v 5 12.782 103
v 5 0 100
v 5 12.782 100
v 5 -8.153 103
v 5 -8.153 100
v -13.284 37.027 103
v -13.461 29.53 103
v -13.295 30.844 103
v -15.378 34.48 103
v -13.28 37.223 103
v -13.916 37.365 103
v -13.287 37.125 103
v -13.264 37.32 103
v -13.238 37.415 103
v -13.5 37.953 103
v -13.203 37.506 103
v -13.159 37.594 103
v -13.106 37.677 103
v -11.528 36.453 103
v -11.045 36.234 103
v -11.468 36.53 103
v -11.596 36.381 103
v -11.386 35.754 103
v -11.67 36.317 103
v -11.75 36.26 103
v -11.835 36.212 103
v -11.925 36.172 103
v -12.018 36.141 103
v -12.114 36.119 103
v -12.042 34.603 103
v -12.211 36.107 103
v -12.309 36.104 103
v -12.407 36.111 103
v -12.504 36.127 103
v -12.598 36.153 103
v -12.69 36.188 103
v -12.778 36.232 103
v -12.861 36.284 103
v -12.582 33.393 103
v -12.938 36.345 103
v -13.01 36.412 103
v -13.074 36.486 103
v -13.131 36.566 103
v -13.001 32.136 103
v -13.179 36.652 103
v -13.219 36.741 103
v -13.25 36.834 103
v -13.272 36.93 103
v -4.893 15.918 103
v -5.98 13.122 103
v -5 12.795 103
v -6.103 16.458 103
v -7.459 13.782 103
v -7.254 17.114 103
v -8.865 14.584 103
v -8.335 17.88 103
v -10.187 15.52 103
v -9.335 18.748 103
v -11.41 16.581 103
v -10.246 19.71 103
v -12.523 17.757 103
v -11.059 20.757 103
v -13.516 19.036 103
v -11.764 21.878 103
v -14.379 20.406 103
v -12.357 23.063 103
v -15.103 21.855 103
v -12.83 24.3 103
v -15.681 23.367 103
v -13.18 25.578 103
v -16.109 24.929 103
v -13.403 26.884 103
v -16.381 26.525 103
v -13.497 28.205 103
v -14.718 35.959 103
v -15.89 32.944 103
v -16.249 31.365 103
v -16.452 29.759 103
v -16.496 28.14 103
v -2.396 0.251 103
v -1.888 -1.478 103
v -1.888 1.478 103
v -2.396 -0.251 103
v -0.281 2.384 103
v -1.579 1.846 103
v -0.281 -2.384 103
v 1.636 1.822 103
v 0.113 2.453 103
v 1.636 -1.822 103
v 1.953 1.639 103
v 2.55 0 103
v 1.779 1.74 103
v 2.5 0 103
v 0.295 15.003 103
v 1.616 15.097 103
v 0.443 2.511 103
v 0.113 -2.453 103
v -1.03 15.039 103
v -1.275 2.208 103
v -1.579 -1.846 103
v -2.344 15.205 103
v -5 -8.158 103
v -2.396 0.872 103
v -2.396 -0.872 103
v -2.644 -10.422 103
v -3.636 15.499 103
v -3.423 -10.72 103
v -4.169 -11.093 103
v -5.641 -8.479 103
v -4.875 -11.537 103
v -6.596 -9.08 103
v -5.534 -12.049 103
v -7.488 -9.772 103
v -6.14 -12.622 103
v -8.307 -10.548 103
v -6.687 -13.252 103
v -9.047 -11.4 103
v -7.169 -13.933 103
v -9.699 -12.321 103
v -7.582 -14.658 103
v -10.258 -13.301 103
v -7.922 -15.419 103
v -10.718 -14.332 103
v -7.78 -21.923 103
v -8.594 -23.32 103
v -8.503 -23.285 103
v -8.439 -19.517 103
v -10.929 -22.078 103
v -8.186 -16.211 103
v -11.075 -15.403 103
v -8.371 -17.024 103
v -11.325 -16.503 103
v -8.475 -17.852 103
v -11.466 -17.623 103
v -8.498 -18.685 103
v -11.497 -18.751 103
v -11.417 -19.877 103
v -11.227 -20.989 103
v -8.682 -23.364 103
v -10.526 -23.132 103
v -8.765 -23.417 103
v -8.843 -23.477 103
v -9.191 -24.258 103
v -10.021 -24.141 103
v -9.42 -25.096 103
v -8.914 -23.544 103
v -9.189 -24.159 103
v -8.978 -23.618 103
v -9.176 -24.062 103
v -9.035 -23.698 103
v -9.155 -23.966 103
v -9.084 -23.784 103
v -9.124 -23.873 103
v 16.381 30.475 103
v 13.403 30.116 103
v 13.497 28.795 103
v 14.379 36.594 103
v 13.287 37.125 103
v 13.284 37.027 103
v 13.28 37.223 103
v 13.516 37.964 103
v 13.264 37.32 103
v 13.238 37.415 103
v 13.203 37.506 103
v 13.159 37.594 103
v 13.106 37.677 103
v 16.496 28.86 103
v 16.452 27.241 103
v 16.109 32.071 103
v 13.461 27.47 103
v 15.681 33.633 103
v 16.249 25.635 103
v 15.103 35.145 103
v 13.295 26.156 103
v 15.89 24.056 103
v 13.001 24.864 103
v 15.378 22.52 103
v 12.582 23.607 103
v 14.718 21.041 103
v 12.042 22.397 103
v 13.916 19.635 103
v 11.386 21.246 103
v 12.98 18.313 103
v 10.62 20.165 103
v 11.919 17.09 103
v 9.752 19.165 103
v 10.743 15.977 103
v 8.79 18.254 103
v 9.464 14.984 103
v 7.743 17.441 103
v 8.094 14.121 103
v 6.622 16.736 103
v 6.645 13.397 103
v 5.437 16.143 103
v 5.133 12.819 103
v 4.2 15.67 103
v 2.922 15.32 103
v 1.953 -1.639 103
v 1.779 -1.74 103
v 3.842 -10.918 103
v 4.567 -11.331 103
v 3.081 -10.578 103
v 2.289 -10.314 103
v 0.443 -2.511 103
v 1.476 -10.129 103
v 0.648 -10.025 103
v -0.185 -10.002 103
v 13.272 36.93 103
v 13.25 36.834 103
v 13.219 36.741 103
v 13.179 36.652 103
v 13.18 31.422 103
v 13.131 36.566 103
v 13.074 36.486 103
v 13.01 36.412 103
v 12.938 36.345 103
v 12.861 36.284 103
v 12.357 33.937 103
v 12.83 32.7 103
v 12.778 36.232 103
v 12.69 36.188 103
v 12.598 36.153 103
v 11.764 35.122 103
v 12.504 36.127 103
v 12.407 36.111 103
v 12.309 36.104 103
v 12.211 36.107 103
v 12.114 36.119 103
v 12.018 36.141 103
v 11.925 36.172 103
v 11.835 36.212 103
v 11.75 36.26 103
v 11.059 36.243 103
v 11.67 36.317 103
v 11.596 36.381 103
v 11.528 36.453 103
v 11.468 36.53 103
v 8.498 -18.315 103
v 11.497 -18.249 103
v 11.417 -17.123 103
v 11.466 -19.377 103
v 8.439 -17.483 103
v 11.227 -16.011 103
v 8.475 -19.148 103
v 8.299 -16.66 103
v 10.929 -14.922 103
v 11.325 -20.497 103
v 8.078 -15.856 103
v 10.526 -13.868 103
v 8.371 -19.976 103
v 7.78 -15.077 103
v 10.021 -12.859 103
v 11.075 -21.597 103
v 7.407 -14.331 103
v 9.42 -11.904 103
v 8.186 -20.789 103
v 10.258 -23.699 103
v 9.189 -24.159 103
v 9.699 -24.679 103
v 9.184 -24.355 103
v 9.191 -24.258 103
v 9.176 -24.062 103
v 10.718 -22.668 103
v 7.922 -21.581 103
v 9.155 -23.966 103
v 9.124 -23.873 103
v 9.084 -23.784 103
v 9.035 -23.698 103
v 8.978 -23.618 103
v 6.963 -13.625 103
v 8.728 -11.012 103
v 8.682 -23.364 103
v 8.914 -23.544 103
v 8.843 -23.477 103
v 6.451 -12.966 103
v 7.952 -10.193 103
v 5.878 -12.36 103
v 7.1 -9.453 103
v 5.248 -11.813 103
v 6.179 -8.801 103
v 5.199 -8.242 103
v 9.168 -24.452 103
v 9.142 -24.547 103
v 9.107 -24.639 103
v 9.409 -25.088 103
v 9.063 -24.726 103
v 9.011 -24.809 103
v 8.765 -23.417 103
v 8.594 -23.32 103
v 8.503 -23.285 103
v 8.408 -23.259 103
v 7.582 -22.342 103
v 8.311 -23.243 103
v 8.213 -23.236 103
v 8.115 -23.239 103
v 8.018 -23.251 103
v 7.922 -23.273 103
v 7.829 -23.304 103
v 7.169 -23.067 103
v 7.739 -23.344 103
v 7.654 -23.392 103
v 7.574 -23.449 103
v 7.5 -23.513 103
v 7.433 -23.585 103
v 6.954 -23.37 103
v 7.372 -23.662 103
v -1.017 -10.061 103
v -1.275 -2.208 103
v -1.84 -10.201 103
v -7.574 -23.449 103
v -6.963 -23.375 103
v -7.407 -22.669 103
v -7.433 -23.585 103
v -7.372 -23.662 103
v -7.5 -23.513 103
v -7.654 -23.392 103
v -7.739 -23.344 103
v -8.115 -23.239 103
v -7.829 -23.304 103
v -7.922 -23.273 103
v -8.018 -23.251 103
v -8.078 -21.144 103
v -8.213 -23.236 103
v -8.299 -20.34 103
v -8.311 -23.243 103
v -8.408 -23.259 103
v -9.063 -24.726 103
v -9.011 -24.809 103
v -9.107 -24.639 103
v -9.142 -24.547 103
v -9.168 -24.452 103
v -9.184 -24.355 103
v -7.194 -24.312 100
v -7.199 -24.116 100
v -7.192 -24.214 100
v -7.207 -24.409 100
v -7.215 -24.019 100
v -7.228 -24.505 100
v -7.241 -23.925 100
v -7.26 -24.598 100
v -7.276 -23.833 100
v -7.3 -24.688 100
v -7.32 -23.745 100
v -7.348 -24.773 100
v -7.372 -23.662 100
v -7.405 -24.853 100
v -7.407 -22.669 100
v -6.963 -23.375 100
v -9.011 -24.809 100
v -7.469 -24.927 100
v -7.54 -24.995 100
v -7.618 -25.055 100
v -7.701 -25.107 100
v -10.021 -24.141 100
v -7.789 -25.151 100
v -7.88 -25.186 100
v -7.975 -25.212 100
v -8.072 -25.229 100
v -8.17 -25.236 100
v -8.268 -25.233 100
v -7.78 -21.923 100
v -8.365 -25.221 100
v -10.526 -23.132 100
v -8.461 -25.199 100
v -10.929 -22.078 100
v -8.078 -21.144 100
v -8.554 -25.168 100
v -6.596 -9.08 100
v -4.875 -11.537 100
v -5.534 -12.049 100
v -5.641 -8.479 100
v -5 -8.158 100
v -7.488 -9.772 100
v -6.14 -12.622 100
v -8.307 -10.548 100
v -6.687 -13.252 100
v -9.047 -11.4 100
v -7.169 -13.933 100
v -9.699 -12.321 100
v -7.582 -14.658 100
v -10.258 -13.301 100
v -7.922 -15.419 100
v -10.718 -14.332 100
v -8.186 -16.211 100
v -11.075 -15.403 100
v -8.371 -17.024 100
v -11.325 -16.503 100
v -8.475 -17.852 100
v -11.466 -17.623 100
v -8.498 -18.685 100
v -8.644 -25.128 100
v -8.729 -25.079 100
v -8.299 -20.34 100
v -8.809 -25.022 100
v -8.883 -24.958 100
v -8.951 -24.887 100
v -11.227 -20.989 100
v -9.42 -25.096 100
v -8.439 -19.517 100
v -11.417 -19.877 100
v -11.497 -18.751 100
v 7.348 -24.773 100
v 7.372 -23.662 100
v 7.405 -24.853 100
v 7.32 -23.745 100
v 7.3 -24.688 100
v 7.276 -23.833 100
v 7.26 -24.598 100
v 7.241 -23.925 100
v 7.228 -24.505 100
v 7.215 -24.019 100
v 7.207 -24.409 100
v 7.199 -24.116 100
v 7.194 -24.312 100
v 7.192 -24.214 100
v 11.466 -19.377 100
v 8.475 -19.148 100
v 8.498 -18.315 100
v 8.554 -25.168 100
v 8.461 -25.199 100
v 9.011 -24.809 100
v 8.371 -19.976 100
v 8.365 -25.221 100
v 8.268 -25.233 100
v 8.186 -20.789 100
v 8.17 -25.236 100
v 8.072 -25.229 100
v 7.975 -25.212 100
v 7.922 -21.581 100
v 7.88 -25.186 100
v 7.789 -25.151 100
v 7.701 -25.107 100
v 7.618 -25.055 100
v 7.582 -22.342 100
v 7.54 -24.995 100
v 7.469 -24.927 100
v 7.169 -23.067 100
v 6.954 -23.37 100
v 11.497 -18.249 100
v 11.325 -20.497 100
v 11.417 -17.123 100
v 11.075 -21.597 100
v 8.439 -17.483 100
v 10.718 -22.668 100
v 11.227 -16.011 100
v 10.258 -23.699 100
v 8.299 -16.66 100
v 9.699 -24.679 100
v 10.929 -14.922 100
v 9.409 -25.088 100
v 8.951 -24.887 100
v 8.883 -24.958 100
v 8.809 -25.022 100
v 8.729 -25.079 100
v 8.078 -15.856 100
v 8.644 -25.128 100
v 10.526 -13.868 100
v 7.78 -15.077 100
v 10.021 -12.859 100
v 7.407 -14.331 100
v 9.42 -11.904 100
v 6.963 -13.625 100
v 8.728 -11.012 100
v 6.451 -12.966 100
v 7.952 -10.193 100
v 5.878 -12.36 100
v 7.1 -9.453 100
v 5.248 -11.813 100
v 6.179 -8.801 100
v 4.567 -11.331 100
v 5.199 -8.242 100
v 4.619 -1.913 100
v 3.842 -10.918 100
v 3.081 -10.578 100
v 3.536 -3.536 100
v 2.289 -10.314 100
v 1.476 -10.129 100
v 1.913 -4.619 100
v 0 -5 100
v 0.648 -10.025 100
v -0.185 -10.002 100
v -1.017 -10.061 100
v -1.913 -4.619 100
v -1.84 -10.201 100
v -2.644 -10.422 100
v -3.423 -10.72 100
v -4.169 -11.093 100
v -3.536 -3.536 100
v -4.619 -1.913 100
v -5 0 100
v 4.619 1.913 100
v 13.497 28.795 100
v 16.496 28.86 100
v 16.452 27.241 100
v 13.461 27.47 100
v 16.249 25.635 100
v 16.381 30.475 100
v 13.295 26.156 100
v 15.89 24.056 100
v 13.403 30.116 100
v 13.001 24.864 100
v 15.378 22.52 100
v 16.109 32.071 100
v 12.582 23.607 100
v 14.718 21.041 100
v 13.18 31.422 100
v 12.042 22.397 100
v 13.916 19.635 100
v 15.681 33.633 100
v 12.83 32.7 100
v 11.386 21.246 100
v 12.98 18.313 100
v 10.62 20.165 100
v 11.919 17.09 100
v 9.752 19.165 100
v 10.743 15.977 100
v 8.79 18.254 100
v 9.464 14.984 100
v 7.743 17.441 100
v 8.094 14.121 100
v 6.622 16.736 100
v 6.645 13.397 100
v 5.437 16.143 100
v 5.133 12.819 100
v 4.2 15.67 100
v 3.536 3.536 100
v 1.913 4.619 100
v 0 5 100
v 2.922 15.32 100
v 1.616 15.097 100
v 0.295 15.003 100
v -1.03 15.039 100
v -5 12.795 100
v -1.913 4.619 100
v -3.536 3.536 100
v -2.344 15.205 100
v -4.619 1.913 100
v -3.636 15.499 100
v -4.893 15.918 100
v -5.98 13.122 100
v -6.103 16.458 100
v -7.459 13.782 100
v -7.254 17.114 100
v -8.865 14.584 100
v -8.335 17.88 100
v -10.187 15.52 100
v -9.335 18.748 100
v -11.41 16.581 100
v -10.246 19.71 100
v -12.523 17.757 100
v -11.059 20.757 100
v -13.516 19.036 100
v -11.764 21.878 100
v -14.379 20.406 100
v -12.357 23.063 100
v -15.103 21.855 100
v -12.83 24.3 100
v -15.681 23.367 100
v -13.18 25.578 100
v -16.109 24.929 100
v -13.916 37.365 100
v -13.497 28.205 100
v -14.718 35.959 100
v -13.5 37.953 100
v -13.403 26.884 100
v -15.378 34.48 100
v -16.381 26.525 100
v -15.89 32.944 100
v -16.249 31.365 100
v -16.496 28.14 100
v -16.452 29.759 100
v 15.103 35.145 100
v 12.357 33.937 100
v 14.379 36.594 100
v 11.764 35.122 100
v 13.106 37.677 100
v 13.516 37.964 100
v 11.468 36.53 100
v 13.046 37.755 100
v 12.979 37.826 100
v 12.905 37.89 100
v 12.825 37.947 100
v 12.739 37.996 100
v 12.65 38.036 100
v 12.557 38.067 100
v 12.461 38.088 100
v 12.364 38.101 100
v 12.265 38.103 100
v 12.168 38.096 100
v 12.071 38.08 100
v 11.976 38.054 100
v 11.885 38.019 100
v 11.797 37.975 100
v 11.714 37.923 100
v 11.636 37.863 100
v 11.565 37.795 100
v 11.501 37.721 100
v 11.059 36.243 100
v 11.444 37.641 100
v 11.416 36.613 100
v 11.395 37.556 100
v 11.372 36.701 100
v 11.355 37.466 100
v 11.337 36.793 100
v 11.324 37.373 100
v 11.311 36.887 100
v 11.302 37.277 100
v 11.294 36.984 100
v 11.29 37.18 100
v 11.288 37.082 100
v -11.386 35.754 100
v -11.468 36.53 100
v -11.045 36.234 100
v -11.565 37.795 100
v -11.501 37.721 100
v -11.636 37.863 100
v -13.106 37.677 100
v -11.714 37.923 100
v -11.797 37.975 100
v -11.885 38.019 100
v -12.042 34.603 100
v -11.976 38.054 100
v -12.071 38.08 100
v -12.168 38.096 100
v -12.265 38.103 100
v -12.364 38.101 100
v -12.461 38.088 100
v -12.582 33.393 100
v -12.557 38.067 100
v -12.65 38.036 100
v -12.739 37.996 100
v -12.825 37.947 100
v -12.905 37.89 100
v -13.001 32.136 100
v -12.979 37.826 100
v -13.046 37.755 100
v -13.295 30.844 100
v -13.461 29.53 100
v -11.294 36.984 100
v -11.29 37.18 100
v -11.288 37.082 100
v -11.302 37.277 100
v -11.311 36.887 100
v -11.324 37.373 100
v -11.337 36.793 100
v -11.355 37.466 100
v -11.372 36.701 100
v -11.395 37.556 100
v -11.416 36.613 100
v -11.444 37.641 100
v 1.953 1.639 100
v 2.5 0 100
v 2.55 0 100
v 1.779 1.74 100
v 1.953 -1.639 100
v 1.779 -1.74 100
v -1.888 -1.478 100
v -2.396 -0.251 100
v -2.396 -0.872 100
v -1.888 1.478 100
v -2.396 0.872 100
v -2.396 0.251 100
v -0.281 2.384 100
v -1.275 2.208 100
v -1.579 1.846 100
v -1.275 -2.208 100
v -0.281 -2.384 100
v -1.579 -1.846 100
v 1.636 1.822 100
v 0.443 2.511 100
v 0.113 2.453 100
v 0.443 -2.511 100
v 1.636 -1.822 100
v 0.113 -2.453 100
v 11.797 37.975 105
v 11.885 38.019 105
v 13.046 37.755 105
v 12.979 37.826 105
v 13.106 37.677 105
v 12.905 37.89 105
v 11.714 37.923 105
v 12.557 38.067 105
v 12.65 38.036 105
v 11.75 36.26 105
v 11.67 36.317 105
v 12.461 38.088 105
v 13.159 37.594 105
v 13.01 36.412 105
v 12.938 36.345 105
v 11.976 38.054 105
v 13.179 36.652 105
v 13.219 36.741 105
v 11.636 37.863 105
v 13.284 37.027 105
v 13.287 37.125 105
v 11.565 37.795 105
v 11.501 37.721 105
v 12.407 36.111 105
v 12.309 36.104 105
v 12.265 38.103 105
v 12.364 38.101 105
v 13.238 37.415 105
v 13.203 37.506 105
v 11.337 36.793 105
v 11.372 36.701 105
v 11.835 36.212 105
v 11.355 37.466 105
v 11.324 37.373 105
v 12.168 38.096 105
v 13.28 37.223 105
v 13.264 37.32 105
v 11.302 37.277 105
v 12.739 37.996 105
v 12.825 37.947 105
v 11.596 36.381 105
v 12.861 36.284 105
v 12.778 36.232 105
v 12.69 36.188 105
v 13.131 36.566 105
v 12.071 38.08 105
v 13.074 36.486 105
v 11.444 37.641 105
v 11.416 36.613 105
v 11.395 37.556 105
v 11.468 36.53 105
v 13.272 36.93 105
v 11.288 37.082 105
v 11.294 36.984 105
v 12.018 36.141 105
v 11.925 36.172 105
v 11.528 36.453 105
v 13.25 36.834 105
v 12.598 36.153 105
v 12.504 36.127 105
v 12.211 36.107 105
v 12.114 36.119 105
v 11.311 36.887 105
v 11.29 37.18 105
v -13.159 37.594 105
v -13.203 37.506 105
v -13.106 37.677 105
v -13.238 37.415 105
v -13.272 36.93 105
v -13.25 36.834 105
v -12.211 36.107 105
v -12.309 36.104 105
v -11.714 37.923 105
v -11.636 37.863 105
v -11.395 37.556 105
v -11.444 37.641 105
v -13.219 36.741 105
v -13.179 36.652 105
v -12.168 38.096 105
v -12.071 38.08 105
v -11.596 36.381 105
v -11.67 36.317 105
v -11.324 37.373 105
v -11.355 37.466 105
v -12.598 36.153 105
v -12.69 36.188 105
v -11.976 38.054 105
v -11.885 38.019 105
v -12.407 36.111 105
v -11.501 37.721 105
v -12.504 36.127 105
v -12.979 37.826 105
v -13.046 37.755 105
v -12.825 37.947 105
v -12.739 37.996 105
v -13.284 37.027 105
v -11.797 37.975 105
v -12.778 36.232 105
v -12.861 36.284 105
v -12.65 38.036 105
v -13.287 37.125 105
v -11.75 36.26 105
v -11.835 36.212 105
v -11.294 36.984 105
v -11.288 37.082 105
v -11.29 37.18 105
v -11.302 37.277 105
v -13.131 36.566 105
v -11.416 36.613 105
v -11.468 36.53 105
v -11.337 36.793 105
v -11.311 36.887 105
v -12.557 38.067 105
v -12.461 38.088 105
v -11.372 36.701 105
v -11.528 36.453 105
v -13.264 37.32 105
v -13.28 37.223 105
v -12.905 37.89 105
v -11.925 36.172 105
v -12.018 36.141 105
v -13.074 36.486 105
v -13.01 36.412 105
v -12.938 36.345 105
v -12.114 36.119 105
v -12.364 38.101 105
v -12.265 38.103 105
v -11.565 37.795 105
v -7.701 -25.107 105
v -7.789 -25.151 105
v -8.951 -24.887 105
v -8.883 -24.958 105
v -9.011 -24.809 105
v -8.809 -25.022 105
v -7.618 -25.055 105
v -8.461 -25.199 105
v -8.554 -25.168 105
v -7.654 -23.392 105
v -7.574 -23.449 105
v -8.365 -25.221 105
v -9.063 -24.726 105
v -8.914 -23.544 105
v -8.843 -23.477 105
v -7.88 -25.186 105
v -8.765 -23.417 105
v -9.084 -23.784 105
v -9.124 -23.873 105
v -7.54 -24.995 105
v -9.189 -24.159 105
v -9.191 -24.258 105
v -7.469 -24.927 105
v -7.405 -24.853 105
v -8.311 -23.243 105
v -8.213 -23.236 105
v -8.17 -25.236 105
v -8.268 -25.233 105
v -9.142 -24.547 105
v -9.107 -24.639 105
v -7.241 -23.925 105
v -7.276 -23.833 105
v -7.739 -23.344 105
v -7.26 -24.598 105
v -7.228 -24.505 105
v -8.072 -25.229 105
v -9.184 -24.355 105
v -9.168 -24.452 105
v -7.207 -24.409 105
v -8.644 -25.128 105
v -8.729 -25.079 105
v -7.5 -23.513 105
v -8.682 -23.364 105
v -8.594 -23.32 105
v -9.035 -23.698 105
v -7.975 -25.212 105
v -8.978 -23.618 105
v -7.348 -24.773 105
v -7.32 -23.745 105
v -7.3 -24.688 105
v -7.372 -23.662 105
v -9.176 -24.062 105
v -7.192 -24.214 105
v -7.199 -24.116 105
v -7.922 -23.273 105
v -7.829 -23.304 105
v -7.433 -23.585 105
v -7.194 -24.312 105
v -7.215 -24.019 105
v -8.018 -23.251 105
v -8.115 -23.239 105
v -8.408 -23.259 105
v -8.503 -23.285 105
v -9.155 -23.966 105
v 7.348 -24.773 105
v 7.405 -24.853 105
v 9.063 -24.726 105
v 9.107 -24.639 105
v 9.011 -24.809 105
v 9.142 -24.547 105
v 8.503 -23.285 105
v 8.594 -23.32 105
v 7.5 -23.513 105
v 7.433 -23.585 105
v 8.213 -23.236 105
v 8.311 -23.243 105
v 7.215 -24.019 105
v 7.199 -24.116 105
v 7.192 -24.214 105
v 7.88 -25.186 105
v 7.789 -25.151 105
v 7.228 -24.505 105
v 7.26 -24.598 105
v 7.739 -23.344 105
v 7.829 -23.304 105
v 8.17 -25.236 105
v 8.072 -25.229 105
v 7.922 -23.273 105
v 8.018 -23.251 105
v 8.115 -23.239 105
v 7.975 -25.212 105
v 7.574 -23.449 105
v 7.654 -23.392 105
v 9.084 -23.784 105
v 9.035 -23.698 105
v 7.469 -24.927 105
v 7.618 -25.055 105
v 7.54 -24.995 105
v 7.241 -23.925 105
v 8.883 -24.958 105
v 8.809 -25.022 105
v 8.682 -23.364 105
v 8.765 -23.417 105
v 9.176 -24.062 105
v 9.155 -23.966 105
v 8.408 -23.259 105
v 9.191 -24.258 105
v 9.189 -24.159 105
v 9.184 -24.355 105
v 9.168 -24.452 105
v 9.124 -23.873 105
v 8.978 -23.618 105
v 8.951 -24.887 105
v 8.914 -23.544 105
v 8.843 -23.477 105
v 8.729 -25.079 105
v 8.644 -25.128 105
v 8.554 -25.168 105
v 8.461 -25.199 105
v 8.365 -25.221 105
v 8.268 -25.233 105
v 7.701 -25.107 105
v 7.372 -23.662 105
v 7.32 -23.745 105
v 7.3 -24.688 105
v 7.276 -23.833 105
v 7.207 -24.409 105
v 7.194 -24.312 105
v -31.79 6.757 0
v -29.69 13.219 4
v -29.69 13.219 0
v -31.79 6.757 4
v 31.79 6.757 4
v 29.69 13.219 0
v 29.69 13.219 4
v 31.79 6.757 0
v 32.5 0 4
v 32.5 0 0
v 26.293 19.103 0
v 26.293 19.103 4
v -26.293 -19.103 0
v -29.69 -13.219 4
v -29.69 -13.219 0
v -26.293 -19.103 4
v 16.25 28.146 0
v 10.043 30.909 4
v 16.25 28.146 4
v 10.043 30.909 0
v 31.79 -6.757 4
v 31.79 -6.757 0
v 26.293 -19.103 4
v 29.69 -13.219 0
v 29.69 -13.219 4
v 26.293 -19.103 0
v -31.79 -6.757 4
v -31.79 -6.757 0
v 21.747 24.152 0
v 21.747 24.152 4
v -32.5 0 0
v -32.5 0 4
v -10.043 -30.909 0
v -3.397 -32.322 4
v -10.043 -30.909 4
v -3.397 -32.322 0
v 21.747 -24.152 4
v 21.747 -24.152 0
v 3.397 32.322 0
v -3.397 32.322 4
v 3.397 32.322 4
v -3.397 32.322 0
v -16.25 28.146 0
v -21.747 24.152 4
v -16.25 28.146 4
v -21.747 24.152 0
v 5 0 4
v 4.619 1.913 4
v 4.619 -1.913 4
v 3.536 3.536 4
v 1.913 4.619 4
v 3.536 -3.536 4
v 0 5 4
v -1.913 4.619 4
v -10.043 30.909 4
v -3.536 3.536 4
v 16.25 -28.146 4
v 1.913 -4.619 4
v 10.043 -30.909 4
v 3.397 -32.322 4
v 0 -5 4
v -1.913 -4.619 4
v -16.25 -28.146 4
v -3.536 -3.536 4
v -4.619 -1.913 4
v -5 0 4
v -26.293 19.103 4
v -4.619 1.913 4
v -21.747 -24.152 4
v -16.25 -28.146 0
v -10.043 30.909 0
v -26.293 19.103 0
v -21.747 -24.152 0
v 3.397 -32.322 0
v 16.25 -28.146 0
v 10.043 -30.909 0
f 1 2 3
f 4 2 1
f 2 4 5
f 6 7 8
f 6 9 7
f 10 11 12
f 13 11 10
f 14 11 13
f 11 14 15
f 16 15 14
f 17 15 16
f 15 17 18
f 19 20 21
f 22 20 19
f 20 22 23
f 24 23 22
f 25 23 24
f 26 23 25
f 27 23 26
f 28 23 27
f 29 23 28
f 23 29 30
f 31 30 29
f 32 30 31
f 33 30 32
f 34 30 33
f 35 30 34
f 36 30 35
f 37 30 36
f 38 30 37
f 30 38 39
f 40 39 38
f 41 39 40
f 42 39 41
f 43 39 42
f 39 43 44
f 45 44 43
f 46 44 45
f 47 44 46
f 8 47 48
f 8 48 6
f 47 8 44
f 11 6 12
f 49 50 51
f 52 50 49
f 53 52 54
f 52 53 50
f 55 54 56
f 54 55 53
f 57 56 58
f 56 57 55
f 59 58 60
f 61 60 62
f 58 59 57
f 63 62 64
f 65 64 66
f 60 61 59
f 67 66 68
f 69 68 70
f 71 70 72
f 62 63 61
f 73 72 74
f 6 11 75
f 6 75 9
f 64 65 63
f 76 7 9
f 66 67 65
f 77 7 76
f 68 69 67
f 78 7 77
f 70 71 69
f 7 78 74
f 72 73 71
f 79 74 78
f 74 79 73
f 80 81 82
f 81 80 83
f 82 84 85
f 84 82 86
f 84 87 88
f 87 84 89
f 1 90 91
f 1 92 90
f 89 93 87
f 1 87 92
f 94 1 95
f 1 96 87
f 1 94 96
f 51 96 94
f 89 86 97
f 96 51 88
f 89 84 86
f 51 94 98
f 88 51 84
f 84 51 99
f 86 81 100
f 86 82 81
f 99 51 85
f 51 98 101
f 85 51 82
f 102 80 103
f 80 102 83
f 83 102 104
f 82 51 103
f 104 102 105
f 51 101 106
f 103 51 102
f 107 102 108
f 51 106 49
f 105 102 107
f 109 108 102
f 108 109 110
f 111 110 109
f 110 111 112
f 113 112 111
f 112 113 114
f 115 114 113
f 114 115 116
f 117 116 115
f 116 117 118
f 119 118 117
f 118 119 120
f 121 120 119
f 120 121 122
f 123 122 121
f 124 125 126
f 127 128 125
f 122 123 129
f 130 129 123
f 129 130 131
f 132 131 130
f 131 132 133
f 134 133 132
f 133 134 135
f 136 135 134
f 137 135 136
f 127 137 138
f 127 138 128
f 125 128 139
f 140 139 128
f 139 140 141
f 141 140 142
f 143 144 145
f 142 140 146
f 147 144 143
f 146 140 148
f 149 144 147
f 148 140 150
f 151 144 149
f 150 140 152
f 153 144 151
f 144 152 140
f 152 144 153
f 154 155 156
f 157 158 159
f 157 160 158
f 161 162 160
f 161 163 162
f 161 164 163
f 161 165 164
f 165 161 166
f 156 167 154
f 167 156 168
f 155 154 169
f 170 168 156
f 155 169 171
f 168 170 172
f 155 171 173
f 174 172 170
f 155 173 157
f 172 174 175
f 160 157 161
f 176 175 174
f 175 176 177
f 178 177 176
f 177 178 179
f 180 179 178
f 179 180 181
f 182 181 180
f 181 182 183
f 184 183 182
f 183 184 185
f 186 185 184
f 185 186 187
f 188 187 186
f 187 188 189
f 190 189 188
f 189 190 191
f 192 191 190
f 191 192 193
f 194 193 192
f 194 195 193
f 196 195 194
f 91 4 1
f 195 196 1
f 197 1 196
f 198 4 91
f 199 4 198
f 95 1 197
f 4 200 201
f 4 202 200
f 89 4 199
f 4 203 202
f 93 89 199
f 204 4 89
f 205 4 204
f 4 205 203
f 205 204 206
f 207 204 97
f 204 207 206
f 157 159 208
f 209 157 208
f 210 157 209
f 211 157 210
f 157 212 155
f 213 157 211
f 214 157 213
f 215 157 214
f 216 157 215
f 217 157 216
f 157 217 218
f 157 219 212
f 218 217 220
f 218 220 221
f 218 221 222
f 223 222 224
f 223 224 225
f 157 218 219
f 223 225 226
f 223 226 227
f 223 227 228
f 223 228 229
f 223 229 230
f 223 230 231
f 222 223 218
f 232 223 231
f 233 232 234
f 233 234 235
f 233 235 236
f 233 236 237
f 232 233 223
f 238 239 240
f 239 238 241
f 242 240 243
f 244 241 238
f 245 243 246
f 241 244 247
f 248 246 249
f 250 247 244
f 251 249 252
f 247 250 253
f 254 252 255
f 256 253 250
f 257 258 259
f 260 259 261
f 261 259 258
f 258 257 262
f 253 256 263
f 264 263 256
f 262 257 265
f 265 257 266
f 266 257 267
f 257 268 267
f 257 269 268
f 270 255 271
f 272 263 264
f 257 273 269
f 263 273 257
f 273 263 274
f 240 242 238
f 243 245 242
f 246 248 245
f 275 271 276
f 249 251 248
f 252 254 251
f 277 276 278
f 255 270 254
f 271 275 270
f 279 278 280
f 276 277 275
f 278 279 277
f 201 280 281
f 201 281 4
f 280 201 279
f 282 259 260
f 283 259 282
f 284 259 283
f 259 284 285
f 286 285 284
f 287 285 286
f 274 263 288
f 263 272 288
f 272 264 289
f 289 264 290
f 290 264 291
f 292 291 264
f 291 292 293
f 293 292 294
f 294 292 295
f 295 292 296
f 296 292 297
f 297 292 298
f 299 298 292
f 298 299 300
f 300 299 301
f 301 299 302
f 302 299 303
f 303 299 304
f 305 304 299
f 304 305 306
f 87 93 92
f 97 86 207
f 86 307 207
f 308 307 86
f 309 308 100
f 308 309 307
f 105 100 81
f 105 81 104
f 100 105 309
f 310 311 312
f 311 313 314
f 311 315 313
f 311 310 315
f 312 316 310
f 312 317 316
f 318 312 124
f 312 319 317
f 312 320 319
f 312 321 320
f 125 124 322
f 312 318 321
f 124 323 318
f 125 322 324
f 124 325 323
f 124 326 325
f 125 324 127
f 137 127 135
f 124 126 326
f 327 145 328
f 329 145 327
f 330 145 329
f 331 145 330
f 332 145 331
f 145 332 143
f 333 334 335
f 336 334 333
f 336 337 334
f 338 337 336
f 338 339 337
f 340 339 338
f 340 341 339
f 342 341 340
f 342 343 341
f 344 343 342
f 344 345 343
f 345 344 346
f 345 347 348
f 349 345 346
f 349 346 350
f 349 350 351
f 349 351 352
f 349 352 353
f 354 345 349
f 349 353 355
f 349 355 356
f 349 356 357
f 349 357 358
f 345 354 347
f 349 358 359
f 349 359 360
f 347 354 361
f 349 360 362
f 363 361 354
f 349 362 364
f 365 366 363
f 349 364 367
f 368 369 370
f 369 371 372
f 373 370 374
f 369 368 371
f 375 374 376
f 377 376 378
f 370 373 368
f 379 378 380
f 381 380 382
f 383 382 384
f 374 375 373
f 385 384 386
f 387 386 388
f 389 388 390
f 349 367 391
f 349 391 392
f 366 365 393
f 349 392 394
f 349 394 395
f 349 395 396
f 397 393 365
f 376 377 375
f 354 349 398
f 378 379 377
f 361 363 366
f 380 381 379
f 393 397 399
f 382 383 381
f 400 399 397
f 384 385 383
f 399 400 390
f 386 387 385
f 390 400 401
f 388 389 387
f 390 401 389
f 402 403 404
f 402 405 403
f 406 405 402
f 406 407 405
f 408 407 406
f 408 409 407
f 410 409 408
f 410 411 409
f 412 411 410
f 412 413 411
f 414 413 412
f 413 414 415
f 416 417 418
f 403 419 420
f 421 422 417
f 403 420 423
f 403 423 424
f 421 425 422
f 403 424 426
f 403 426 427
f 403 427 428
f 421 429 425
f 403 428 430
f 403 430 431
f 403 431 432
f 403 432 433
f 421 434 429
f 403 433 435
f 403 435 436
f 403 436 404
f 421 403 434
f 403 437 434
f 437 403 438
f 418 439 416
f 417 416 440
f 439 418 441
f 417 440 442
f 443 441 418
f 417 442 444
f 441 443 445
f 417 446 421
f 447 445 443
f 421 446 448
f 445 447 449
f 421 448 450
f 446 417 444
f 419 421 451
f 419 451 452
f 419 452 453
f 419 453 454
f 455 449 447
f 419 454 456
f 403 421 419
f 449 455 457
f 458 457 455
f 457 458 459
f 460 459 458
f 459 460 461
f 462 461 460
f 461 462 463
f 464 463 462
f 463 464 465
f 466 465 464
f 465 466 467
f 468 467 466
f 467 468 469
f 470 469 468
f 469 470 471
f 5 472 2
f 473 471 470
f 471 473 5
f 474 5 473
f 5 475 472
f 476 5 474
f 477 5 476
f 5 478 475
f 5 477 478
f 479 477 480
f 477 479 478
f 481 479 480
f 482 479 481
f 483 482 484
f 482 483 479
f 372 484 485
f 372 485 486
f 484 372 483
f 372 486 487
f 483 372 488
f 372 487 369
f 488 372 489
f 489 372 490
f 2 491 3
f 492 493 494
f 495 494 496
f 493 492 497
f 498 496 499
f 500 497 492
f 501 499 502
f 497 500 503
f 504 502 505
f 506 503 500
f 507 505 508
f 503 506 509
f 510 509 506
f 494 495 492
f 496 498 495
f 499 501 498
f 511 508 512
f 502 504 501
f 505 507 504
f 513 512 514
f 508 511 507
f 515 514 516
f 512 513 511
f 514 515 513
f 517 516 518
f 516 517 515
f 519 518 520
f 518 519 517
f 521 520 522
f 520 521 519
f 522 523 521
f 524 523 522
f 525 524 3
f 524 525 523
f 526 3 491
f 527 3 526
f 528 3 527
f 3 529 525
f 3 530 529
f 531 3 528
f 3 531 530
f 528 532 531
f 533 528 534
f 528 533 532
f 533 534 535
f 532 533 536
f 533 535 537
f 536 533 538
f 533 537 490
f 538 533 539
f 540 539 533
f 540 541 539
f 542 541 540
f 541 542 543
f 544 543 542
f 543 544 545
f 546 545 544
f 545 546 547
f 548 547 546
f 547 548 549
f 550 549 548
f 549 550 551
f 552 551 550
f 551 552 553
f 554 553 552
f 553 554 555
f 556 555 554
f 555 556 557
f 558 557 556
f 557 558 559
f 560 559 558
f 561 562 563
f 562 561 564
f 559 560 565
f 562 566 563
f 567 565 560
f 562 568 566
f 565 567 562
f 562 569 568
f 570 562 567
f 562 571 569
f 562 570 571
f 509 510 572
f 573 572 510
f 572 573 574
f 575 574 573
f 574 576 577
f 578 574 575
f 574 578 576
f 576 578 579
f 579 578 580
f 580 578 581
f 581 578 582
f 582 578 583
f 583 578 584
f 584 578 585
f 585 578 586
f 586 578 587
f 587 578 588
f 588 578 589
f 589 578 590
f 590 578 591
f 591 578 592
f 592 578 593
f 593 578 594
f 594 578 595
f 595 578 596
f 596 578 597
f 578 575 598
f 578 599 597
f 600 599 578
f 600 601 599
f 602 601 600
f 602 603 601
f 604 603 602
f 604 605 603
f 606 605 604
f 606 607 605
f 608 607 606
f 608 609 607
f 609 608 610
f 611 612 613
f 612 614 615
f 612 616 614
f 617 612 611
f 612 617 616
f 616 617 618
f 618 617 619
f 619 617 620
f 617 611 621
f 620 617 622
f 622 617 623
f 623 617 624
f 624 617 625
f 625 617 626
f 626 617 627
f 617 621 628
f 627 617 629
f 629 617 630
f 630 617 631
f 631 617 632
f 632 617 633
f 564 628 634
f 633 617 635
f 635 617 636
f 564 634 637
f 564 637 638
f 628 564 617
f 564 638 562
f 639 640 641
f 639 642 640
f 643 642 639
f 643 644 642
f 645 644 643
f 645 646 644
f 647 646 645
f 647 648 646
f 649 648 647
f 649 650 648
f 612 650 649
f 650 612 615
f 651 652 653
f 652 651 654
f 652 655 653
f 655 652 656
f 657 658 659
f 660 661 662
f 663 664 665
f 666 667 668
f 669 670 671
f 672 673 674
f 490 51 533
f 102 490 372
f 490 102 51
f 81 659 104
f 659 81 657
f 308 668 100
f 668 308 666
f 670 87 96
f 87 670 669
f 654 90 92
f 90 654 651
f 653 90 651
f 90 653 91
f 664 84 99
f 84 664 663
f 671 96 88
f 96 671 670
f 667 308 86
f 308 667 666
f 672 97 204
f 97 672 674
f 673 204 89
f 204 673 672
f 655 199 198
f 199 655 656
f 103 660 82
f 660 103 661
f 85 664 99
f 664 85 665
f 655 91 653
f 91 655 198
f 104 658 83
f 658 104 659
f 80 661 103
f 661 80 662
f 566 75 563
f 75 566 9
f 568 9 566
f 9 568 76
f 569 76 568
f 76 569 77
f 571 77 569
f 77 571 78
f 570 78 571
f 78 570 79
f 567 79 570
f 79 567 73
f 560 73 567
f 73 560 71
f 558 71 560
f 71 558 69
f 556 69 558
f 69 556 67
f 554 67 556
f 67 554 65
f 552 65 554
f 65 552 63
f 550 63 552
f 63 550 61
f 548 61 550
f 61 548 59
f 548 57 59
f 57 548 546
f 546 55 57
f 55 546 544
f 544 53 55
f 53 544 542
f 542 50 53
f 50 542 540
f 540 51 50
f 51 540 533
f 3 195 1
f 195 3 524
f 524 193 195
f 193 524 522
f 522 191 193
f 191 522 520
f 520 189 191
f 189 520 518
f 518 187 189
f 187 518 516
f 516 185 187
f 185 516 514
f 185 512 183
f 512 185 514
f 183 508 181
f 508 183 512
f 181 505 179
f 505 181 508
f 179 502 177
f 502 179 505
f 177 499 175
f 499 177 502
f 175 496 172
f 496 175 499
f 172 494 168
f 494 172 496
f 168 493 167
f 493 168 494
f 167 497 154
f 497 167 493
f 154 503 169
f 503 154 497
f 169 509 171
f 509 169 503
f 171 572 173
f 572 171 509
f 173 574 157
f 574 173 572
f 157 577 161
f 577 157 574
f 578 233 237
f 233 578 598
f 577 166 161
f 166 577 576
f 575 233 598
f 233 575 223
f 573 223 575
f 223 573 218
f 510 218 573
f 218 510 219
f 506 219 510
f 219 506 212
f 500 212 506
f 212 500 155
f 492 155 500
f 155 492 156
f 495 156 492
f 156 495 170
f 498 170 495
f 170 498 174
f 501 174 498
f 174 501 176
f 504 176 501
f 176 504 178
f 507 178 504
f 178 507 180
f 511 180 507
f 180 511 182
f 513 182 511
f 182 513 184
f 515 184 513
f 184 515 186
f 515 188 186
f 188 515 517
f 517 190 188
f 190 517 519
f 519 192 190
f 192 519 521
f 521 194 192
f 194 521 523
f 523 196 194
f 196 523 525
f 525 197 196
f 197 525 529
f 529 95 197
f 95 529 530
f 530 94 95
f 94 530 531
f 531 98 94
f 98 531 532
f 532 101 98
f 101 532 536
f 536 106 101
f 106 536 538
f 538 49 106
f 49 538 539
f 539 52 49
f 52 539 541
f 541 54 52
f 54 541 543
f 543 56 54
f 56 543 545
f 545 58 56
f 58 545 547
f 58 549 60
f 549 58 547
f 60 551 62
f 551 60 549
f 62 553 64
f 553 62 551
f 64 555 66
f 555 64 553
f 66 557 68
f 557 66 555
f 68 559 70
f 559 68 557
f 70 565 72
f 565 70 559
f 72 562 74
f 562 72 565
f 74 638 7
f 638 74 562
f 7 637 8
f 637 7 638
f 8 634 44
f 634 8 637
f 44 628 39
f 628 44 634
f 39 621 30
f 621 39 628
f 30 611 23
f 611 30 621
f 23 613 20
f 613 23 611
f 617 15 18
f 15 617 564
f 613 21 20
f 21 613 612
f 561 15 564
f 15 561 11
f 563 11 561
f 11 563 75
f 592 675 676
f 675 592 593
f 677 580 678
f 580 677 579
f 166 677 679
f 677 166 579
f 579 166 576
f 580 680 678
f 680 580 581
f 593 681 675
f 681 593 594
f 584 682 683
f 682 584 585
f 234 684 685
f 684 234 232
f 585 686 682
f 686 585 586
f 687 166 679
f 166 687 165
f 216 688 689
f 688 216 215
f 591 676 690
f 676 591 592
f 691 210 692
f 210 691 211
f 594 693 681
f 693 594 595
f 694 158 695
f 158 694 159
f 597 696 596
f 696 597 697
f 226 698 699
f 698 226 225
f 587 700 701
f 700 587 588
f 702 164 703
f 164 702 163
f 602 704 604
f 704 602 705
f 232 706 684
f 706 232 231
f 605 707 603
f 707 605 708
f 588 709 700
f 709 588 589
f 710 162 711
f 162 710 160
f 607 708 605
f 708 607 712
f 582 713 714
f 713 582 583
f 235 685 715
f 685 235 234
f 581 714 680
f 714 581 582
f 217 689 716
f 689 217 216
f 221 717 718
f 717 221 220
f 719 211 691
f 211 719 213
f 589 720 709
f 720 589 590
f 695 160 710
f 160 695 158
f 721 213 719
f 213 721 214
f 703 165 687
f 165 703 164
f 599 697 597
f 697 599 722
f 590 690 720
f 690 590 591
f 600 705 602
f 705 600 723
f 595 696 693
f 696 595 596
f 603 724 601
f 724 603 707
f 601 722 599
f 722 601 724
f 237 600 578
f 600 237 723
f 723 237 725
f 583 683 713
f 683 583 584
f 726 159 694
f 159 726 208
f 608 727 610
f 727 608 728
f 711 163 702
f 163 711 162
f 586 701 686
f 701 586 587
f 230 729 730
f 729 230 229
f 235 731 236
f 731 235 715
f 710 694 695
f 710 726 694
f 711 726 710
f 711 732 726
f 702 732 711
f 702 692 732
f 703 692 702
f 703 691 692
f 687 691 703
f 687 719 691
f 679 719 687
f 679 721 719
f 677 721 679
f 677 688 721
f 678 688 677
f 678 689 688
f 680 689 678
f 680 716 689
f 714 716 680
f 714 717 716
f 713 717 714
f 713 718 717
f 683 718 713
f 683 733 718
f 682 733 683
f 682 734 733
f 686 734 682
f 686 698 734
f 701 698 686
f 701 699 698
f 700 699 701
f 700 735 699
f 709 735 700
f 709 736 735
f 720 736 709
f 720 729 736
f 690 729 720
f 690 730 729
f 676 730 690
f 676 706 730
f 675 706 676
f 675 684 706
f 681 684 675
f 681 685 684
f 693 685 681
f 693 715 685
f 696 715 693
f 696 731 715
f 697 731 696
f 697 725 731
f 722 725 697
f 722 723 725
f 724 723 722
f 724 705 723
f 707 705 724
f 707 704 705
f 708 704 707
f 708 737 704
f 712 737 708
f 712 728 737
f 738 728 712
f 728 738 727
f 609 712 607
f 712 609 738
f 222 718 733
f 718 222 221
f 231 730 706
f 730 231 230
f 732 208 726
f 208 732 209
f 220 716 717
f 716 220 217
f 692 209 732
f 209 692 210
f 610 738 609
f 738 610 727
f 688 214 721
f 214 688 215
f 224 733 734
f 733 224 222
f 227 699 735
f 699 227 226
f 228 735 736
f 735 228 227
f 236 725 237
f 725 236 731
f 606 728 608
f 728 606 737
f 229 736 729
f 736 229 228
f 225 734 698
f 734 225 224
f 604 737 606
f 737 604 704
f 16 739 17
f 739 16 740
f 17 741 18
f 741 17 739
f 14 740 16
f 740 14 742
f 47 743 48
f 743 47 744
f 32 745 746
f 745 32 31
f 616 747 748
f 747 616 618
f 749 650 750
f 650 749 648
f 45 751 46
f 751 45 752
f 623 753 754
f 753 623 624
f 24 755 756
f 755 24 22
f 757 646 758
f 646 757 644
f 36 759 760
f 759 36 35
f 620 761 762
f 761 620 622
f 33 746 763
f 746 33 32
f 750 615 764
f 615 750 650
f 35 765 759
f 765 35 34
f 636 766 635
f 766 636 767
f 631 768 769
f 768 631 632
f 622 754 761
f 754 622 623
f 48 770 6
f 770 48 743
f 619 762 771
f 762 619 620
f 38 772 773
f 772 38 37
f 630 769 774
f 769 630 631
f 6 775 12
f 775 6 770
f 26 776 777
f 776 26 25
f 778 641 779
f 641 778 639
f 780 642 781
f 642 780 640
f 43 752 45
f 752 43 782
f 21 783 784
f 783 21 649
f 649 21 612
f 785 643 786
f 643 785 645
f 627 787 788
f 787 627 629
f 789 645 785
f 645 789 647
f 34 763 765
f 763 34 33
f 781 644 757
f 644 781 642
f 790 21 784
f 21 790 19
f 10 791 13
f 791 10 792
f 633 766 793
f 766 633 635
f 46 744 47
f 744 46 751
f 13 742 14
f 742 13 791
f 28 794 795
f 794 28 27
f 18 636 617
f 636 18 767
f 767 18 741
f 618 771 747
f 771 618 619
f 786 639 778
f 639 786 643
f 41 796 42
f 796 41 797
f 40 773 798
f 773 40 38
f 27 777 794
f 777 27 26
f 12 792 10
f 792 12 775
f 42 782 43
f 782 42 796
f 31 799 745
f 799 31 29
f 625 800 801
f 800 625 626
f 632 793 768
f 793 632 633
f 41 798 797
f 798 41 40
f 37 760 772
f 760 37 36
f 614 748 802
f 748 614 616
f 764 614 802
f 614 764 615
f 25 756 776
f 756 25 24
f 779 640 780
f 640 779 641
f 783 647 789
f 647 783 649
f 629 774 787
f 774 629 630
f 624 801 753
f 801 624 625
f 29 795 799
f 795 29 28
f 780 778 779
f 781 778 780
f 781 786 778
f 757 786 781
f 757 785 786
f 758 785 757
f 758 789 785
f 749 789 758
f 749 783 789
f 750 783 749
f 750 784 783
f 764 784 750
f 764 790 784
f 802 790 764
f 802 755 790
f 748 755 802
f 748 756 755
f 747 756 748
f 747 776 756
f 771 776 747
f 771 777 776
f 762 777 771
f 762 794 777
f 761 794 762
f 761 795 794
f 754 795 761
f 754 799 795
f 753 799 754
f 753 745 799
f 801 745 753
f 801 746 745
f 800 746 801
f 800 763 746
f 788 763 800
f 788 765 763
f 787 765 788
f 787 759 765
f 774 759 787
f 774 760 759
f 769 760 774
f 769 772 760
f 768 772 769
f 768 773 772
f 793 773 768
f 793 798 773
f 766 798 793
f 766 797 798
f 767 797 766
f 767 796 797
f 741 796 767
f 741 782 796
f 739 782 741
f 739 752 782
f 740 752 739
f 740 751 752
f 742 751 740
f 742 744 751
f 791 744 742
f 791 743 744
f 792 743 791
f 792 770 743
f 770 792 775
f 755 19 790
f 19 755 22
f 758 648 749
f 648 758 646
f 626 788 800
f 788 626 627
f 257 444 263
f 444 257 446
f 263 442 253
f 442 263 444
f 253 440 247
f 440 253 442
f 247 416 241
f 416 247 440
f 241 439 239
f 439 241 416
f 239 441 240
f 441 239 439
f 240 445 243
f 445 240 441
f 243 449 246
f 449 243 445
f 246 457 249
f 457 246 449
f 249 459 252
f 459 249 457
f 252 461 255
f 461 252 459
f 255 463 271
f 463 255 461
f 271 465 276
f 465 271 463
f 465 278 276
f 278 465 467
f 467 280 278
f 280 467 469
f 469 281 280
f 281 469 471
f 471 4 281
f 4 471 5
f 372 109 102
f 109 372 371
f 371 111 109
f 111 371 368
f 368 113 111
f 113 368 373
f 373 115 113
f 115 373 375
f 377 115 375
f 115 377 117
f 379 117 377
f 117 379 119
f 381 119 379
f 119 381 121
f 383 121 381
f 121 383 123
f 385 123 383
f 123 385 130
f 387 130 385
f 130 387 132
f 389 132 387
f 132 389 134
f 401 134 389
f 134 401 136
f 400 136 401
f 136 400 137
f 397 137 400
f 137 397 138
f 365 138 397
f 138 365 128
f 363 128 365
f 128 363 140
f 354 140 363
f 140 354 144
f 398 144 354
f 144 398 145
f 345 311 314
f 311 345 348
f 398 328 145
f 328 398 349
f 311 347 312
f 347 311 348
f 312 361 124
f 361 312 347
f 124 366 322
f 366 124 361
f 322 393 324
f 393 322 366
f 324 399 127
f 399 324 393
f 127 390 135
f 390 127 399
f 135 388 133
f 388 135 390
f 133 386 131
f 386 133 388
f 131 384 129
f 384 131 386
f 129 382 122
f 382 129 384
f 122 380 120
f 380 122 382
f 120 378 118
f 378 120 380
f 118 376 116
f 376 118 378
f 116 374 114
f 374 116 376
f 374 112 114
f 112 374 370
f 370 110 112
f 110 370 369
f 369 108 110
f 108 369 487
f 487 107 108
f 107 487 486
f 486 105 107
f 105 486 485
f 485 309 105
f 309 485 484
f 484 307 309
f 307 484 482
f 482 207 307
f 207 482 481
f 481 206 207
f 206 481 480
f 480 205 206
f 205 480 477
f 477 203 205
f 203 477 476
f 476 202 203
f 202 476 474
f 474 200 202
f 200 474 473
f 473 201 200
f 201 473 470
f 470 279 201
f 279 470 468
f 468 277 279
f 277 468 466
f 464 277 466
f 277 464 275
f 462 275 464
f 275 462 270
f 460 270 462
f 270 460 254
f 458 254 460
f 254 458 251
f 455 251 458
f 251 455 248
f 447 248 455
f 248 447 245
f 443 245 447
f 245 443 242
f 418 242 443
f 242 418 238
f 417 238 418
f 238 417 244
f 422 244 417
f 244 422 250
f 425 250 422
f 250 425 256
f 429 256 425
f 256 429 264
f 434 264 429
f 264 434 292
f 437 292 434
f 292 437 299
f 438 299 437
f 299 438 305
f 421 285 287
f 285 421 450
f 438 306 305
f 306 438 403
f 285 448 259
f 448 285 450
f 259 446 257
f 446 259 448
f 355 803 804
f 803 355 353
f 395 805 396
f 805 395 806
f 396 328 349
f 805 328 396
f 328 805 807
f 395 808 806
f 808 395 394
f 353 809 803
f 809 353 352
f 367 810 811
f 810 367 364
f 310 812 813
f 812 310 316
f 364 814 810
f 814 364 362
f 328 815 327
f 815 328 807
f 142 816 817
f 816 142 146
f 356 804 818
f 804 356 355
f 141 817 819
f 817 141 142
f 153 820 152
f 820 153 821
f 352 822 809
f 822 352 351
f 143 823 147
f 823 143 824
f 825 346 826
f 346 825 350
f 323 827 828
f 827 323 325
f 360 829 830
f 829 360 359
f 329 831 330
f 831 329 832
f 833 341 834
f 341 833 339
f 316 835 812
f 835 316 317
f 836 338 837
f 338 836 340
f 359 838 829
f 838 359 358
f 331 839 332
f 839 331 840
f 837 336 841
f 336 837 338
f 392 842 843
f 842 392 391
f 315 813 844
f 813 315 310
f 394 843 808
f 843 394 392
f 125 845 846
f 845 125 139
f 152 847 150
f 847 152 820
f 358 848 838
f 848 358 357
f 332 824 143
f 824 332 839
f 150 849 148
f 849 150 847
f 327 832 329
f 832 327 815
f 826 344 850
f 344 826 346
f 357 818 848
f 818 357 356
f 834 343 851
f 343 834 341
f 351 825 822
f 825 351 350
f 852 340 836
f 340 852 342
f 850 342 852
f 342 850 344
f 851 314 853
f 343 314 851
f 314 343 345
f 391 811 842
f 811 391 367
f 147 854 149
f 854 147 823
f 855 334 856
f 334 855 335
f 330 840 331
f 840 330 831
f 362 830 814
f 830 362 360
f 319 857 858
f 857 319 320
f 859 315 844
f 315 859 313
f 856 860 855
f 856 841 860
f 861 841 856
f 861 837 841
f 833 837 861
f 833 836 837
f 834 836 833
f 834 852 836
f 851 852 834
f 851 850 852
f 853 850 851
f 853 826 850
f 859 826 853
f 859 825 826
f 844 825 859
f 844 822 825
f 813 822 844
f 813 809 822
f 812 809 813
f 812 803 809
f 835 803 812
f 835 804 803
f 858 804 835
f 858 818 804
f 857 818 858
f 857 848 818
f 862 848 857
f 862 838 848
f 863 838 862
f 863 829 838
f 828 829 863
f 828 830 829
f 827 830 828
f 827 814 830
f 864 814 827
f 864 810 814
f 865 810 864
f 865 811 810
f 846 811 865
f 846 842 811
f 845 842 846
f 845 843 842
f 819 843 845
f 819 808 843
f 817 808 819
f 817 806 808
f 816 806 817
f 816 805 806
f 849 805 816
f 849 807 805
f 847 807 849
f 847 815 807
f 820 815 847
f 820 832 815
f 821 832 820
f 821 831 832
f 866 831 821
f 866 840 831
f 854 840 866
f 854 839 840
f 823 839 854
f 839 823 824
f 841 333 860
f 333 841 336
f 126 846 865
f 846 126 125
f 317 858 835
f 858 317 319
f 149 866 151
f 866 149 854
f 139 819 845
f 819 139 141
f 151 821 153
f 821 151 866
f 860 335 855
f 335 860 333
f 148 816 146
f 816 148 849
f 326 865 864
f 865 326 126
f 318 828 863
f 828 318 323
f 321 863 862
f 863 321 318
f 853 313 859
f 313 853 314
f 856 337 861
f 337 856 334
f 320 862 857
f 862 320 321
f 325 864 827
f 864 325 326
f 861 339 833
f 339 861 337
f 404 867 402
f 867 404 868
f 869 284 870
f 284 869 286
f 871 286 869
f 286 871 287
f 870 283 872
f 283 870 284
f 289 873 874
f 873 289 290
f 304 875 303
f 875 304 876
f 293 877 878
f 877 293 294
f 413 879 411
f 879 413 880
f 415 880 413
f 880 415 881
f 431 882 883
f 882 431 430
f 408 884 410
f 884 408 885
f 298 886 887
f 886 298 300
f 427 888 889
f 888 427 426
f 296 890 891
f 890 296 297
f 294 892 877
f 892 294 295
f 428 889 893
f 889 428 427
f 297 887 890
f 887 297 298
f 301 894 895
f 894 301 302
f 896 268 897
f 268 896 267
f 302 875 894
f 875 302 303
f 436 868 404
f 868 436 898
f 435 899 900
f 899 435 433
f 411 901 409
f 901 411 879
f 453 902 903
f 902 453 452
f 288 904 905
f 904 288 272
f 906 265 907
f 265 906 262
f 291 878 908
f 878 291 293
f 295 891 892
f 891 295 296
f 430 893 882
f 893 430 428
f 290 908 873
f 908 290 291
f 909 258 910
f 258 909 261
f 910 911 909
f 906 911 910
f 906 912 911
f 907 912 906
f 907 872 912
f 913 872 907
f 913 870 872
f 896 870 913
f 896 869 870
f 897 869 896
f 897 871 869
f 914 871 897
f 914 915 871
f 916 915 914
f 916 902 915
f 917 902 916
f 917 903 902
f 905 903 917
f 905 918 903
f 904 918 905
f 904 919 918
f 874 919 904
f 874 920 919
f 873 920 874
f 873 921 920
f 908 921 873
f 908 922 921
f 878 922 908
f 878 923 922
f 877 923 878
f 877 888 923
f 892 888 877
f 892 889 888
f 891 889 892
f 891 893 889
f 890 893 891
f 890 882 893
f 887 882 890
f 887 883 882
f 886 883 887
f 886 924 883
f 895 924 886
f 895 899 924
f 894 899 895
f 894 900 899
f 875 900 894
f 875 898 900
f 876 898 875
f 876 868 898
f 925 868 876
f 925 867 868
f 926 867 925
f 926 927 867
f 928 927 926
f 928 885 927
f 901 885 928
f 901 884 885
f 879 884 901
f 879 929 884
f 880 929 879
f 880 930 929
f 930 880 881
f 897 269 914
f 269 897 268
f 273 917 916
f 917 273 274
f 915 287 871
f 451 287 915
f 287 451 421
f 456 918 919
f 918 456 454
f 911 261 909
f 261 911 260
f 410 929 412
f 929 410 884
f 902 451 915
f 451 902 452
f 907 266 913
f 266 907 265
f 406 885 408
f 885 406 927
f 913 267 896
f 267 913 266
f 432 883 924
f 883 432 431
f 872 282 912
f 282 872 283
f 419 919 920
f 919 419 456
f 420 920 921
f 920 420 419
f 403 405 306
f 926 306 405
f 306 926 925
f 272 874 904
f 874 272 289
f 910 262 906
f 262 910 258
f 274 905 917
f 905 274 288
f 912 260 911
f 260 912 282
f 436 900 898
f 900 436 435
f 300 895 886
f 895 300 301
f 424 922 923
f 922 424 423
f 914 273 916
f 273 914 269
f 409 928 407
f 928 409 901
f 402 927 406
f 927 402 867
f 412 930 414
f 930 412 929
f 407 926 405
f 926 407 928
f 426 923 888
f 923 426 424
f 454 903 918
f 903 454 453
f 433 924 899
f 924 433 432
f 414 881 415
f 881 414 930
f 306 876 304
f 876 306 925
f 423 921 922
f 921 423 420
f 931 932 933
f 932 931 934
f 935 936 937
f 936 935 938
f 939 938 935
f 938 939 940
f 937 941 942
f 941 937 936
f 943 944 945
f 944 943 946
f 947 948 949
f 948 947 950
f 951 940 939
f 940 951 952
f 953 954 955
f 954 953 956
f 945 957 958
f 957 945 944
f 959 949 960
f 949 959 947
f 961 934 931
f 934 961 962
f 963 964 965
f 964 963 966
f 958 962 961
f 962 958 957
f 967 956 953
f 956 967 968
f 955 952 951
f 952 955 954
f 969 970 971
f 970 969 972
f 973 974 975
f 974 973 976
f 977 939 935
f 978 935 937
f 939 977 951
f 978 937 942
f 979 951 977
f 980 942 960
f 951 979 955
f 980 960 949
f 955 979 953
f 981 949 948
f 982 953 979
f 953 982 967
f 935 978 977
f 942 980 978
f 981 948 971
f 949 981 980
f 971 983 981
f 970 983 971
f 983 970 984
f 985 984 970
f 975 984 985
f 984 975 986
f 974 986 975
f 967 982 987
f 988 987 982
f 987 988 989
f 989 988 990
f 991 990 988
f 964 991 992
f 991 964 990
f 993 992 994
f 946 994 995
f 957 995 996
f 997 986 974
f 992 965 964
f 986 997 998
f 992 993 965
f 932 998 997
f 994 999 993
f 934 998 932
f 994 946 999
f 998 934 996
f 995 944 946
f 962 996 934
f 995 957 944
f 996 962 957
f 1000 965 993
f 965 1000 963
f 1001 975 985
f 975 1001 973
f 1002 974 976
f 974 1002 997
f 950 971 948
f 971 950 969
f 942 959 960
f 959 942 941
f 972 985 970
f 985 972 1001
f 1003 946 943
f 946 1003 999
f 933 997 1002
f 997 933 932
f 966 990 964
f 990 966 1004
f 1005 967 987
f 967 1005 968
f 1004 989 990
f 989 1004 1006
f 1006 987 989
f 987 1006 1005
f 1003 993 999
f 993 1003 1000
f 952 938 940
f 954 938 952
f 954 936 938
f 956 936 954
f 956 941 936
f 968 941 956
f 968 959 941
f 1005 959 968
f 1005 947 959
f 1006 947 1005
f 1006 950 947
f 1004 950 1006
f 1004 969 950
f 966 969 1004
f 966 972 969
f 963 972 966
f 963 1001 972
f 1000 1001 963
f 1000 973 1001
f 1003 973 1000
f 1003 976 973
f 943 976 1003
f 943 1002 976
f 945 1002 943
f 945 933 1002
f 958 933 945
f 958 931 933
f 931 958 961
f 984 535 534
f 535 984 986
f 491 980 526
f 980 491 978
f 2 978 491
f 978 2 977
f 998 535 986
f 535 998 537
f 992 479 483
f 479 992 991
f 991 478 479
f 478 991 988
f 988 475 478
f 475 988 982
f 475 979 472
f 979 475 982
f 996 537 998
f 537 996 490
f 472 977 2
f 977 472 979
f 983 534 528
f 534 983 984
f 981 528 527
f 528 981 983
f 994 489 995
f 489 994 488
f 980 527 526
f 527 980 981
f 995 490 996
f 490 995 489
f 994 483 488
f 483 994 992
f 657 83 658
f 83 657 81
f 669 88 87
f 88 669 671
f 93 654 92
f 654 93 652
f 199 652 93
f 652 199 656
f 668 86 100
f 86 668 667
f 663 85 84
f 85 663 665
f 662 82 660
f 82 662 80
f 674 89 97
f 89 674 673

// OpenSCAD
/* [Global] */

part = "both"; // [side:Side By Side,both:Both,top:Top,bottom:Bottom]

/* [Base] */

//Base Diameter
base_d = 65;
//Base height
base_h = 4;
//Stand diameter
stand_d = 10;
//Stand height
stand_h = 100;
//Connector nub diameter
conn_d = 5;

/* [Top] */

//Width of holder bar
bar_w = 10;
//Length of brush holder to center
bar_l_brush = 15;
//Length of razor holder to center
bar_l_razor = 10;
//Height of holder bar
bar_h = 3;

//Brush diameter (should be a a few mm than actual)
brush_d = 27;
//Razor diameter (should be a a few mm than actual)
razor_d = 17;

//Width of holder arms
holder_w = 6;

/* [Hidden] */
holder_h = bar_h;
bar_l = bar_l_brush + bar_l_razor;
conn_h = holder_h;

// http://forum.openscad.org/Creating-pie-pizza-slice-shape-need-a-dynamic-length-array-td3148.html
module pie_slice(d, angle) {
    $fn=64;
    R = d / 2 * sqrt(2) + 1;
    a0 = (0 * angle) / 4;
    a1 = (1 * angle) / 4;
    a2 = (2 * angle) / 4;
    a3 = (3 * angle) / 4;
    a4 = (4 * angle) / 4;
    intersection() {
        circle(d=d);
        polygon([
            [0,0],
            [R * cos(a0), R * sin(a0)],
            [R * cos(a1), R * sin(a1)],
            [R * cos(a2), R * sin(a2)],
            [R * cos(a3), R * sin(a3)],
            [R * cos(a4), R * sin(a4)],
            [0,0]
        ]);
    }
}

module holder(width, h, d, angle) {
    $fn=64;
    nub_w = width / 3;
    rotate([0, 0, 90-angle/2])

    union() {
        linear_extrude(h)
        difference() {
            circle(d=d + width);
            circle(d = d);
            pie_slice(d + width, angle);
        }
        translate([d/2 + width/4, 0]) cylinder(5, d=nub_w);
        rotate([0, 0, angle]) translate([d/2 + width/4, 0]) cylinder(5, d=nub_w);
        
    }
}

module bottom() {
    union() {
        cylinder(base_h, d=base_d);
        cylinder(stand_h, d=stand_d);
        cylinder(stand_h + conn_h, d=conn_d);
    }
}

module top() {
    union() {
        difference() {
            translate([-bar_w/2, -bar_l_razor, 0]) cube([bar_w, bar_l, bar_h]);
            translate([0, 0, -1]) cylinder(bar_h + 2, d=5 + .1);
        }
        translate([0, +bar_l_brush + brush_d/2, 0]) 
            holder(holder_w, holder_h, brush_d, 110);
        translate([0, -bar_l_razor - razor_d/2, 0]) 
            rotate([0, 0, 180]) holder(holder_w, holder_h, razor_d, 110);
    }
}

if (part == "bottom") {
    bottom();
} else if (part == "top") {
    top();
} else if (part == "both") {
    translate([0, 0, stand_h]) top();
    bottom();
} else { //if (part == "side") {
    translate([base_d / 2  + max(brush_d, razor_d) / 2 + 10, 0, 0]) top();
    bottom();
}
